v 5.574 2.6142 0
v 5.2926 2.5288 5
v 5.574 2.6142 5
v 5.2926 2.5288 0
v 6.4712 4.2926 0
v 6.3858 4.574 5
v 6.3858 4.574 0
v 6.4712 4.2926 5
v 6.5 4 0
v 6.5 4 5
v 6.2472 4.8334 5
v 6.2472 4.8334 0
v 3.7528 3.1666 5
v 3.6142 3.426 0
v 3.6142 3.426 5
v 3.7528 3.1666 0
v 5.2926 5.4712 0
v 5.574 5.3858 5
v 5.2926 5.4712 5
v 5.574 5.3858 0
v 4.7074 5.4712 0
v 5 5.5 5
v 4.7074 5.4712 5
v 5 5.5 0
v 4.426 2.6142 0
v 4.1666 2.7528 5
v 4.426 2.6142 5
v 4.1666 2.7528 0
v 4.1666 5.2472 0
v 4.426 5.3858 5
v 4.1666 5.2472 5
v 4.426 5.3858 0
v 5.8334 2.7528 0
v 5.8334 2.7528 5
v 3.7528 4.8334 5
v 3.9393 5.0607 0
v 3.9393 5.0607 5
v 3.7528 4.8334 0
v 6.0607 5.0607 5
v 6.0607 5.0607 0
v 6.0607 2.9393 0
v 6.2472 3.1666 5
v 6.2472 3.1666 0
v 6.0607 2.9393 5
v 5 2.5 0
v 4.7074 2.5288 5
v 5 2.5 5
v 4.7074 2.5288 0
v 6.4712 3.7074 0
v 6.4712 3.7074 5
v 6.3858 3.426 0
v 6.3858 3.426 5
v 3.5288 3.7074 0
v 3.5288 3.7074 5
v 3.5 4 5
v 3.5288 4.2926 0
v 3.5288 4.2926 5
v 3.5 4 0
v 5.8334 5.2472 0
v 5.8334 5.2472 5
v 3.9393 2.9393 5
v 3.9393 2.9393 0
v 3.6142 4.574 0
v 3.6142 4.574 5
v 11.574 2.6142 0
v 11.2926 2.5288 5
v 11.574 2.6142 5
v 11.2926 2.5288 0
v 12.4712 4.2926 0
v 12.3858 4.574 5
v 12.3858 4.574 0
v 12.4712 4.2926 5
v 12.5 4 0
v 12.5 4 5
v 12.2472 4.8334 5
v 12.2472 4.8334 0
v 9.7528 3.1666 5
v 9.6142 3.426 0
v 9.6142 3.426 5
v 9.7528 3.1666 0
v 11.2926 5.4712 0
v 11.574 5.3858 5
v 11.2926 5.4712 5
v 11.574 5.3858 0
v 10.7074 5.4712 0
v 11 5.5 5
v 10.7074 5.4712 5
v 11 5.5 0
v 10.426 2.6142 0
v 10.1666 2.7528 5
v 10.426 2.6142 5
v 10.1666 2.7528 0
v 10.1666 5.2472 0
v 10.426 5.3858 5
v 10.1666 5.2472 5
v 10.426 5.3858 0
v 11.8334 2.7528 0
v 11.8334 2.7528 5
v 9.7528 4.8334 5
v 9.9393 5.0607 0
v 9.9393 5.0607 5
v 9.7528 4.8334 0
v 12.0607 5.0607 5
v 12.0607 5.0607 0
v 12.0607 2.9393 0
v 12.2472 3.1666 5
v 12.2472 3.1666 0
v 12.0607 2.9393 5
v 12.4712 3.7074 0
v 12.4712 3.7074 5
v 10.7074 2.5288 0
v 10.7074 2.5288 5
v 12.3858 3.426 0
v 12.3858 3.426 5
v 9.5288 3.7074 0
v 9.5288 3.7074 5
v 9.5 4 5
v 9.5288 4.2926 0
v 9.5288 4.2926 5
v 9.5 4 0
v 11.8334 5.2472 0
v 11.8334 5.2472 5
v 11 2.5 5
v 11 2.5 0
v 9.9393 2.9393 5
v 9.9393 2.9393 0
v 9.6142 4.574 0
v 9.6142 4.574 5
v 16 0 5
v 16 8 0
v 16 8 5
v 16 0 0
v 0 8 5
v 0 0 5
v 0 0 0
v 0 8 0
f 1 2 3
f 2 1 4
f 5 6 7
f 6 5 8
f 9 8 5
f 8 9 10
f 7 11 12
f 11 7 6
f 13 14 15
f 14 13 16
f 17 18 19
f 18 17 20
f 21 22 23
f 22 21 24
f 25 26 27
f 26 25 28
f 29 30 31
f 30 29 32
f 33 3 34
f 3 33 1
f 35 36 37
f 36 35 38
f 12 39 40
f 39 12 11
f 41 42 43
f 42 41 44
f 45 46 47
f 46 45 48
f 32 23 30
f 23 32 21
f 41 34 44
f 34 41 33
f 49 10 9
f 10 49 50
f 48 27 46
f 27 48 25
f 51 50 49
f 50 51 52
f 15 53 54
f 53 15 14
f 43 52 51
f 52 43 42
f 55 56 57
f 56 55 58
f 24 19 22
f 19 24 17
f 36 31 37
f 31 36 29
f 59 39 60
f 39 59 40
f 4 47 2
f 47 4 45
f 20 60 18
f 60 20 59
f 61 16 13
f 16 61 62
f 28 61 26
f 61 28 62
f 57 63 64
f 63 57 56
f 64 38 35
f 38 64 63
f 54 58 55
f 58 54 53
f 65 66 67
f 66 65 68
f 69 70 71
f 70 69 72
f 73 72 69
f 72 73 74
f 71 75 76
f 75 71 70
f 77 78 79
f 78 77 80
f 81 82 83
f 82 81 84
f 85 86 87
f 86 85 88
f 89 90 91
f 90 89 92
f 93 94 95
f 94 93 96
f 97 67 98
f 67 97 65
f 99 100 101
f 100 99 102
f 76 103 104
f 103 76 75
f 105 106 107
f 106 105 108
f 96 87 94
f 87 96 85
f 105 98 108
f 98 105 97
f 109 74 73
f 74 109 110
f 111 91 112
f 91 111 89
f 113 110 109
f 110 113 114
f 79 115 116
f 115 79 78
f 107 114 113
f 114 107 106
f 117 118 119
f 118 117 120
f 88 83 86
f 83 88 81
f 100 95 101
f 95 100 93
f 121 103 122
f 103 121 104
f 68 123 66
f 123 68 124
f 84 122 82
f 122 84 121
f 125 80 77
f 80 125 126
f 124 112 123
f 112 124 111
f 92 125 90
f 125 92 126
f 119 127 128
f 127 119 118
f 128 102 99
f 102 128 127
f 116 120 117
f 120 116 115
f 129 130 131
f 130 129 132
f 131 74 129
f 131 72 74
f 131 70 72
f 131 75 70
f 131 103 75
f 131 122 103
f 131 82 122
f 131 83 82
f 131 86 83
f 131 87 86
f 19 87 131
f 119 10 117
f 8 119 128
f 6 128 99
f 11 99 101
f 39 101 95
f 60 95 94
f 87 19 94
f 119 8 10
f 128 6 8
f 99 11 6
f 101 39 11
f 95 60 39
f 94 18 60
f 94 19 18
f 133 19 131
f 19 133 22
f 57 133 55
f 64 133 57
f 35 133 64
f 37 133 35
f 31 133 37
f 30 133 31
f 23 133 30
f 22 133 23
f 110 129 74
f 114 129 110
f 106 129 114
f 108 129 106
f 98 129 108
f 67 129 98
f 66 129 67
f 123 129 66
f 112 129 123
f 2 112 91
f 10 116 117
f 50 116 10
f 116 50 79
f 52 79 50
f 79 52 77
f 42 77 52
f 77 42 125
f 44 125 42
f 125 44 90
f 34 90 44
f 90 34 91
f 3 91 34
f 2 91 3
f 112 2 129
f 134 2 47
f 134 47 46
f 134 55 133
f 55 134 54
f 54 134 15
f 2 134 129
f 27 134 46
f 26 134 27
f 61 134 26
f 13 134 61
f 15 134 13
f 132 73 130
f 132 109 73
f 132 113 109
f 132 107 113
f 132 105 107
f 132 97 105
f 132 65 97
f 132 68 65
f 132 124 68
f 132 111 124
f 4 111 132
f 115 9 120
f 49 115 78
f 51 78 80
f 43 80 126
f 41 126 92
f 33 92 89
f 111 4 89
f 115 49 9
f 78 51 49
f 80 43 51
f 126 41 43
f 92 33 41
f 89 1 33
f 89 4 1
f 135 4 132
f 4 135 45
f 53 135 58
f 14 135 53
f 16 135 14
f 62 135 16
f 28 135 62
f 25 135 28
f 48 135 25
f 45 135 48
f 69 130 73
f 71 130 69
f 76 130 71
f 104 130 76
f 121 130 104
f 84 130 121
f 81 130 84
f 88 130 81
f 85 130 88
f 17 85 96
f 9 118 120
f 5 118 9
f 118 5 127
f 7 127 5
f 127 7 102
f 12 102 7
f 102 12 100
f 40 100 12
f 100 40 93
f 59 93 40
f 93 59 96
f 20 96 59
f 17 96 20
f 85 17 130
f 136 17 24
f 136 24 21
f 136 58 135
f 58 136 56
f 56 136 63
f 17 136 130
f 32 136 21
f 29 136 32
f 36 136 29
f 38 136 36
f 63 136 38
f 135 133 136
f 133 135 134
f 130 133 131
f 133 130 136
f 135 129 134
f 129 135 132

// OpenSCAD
$fn = 32;

// ----------------------------------------------------------------------
// Micro pad: two-hole pad, 5-20 mm class
// ----------------------------------------------------------------------

// --- parameters (mm) ---
pad_l = 16;               // pad length, X
pad_w = 8;                // pad width, Y
pad_t = 5;                // pad thickness, Z
hole_d = 3;               // hole diameter
hole_x = 5;               // X of the first hole centre
fit_tol = 0.1;            // tolerance for press fits, mm
free_tol = 0.5;           // tolerance for clearance fits, mm

difference() {
  cube([pad_l, pad_w, pad_t]);
  for (x = [hole_x, pad_l - hole_x])
    translate([x, pad_w / 2, -1])
      cylinder(h = pad_t + 2, d = hole_d);
}
